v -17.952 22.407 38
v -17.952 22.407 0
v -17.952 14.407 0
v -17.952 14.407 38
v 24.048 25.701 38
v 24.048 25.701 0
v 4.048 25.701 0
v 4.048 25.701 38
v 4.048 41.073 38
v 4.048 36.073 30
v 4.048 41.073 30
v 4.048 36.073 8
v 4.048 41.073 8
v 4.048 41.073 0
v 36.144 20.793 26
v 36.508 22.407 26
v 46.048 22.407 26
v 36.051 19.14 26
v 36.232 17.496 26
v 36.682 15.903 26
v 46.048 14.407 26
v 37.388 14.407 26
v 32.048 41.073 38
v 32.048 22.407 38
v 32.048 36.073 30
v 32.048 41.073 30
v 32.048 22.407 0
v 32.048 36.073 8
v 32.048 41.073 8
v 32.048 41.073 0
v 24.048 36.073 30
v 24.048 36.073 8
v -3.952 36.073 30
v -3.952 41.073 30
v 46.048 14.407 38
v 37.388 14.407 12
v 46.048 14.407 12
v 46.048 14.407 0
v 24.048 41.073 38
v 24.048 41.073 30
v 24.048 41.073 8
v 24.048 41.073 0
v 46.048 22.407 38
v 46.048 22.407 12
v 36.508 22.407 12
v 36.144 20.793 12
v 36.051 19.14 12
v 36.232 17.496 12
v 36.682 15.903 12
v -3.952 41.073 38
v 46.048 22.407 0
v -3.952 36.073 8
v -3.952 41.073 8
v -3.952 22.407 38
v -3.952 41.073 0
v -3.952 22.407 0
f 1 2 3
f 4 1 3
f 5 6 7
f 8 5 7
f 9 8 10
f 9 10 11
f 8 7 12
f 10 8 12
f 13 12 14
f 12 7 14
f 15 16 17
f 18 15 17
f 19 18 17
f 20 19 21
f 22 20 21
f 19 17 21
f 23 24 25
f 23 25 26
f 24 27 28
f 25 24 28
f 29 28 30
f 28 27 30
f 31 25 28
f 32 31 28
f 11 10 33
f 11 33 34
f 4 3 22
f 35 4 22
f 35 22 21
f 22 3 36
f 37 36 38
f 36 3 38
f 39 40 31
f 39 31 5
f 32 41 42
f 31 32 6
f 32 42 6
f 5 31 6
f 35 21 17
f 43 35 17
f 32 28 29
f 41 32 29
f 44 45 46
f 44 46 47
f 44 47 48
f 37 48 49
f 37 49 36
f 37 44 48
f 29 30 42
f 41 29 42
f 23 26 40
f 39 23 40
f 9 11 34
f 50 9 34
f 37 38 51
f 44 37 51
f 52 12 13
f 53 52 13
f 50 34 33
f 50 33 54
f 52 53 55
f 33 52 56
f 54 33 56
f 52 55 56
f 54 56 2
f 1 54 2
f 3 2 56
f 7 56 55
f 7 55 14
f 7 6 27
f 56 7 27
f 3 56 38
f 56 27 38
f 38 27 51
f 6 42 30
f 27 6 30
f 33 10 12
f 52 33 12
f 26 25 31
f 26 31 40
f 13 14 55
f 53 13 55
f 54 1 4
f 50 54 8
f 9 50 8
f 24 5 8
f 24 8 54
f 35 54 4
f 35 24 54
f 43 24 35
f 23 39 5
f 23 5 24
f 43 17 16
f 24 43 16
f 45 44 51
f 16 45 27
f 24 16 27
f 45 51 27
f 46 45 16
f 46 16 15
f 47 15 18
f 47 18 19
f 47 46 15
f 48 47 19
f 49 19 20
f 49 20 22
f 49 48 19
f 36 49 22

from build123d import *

# Parameters (mm, degrees)
BOSS_EXTRUDE1_DEPTH = 38
SKETCH2_W           = 22
SKETCH2_H           = 10
CUT_EXTRUDE1_DEPTH  = 76.040117824
SKETCH3_W           = 14
SKETCH3_H           = 10


with BuildPart() as part:
    # Sketch1 → Boss-Extrude1 (new body)
    with BuildSketch(Plane.XY):
        Polygon((4.047792592, 41.073340295), (-3.952207408, 41.073340295), (-3.952207408, 22.406673629), (-17.952207408, 22.406673629), (-17.952207408, 14.406673629), (46.047792592, 14.406673629), (46.047792592, 22.406673629), (32.047792592, 22.406673629), (32.047792592, 41.073340295), (24.047792592, 41.073340295), (24.047792592, 25.700791276), (4.047792592, 25.700791276), align=None)
    extrude(amount=BOSS_EXTRUDE1_DEPTH)

    # Sketch2 → Cut-Extrude1 (cut, through all)
    with BuildSketch(Plane(origin=(32.047792592, 0, 0), x_dir=(0, 0, -1), z_dir=(1, 0, 0))):
        with Locations((-19, 41.073340295)):
            Rectangle(SKETCH2_W, SKETCH2_H)
    extrude(amount=-CUT_EXTRUDE1_DEPTH, mode=Mode.SUBTRACT)

    # Sketch3 → Cut-Revolve1 (revolve, cut)
    with BuildSketch(Plane(origin=(46.047792592, 0, 0), x_dir=(0, 0, -1), z_dir=(1, 0, 0))):
        with Locations((-19, 14.406673629)):
            Rectangle(SKETCH3_W, SKETCH3_H)
    revolve(axis=Axis((46.047792592, 19.406673629, 12), (0, 0, 1)), mode=Mode.SUBTRACT)


solid = part.part
